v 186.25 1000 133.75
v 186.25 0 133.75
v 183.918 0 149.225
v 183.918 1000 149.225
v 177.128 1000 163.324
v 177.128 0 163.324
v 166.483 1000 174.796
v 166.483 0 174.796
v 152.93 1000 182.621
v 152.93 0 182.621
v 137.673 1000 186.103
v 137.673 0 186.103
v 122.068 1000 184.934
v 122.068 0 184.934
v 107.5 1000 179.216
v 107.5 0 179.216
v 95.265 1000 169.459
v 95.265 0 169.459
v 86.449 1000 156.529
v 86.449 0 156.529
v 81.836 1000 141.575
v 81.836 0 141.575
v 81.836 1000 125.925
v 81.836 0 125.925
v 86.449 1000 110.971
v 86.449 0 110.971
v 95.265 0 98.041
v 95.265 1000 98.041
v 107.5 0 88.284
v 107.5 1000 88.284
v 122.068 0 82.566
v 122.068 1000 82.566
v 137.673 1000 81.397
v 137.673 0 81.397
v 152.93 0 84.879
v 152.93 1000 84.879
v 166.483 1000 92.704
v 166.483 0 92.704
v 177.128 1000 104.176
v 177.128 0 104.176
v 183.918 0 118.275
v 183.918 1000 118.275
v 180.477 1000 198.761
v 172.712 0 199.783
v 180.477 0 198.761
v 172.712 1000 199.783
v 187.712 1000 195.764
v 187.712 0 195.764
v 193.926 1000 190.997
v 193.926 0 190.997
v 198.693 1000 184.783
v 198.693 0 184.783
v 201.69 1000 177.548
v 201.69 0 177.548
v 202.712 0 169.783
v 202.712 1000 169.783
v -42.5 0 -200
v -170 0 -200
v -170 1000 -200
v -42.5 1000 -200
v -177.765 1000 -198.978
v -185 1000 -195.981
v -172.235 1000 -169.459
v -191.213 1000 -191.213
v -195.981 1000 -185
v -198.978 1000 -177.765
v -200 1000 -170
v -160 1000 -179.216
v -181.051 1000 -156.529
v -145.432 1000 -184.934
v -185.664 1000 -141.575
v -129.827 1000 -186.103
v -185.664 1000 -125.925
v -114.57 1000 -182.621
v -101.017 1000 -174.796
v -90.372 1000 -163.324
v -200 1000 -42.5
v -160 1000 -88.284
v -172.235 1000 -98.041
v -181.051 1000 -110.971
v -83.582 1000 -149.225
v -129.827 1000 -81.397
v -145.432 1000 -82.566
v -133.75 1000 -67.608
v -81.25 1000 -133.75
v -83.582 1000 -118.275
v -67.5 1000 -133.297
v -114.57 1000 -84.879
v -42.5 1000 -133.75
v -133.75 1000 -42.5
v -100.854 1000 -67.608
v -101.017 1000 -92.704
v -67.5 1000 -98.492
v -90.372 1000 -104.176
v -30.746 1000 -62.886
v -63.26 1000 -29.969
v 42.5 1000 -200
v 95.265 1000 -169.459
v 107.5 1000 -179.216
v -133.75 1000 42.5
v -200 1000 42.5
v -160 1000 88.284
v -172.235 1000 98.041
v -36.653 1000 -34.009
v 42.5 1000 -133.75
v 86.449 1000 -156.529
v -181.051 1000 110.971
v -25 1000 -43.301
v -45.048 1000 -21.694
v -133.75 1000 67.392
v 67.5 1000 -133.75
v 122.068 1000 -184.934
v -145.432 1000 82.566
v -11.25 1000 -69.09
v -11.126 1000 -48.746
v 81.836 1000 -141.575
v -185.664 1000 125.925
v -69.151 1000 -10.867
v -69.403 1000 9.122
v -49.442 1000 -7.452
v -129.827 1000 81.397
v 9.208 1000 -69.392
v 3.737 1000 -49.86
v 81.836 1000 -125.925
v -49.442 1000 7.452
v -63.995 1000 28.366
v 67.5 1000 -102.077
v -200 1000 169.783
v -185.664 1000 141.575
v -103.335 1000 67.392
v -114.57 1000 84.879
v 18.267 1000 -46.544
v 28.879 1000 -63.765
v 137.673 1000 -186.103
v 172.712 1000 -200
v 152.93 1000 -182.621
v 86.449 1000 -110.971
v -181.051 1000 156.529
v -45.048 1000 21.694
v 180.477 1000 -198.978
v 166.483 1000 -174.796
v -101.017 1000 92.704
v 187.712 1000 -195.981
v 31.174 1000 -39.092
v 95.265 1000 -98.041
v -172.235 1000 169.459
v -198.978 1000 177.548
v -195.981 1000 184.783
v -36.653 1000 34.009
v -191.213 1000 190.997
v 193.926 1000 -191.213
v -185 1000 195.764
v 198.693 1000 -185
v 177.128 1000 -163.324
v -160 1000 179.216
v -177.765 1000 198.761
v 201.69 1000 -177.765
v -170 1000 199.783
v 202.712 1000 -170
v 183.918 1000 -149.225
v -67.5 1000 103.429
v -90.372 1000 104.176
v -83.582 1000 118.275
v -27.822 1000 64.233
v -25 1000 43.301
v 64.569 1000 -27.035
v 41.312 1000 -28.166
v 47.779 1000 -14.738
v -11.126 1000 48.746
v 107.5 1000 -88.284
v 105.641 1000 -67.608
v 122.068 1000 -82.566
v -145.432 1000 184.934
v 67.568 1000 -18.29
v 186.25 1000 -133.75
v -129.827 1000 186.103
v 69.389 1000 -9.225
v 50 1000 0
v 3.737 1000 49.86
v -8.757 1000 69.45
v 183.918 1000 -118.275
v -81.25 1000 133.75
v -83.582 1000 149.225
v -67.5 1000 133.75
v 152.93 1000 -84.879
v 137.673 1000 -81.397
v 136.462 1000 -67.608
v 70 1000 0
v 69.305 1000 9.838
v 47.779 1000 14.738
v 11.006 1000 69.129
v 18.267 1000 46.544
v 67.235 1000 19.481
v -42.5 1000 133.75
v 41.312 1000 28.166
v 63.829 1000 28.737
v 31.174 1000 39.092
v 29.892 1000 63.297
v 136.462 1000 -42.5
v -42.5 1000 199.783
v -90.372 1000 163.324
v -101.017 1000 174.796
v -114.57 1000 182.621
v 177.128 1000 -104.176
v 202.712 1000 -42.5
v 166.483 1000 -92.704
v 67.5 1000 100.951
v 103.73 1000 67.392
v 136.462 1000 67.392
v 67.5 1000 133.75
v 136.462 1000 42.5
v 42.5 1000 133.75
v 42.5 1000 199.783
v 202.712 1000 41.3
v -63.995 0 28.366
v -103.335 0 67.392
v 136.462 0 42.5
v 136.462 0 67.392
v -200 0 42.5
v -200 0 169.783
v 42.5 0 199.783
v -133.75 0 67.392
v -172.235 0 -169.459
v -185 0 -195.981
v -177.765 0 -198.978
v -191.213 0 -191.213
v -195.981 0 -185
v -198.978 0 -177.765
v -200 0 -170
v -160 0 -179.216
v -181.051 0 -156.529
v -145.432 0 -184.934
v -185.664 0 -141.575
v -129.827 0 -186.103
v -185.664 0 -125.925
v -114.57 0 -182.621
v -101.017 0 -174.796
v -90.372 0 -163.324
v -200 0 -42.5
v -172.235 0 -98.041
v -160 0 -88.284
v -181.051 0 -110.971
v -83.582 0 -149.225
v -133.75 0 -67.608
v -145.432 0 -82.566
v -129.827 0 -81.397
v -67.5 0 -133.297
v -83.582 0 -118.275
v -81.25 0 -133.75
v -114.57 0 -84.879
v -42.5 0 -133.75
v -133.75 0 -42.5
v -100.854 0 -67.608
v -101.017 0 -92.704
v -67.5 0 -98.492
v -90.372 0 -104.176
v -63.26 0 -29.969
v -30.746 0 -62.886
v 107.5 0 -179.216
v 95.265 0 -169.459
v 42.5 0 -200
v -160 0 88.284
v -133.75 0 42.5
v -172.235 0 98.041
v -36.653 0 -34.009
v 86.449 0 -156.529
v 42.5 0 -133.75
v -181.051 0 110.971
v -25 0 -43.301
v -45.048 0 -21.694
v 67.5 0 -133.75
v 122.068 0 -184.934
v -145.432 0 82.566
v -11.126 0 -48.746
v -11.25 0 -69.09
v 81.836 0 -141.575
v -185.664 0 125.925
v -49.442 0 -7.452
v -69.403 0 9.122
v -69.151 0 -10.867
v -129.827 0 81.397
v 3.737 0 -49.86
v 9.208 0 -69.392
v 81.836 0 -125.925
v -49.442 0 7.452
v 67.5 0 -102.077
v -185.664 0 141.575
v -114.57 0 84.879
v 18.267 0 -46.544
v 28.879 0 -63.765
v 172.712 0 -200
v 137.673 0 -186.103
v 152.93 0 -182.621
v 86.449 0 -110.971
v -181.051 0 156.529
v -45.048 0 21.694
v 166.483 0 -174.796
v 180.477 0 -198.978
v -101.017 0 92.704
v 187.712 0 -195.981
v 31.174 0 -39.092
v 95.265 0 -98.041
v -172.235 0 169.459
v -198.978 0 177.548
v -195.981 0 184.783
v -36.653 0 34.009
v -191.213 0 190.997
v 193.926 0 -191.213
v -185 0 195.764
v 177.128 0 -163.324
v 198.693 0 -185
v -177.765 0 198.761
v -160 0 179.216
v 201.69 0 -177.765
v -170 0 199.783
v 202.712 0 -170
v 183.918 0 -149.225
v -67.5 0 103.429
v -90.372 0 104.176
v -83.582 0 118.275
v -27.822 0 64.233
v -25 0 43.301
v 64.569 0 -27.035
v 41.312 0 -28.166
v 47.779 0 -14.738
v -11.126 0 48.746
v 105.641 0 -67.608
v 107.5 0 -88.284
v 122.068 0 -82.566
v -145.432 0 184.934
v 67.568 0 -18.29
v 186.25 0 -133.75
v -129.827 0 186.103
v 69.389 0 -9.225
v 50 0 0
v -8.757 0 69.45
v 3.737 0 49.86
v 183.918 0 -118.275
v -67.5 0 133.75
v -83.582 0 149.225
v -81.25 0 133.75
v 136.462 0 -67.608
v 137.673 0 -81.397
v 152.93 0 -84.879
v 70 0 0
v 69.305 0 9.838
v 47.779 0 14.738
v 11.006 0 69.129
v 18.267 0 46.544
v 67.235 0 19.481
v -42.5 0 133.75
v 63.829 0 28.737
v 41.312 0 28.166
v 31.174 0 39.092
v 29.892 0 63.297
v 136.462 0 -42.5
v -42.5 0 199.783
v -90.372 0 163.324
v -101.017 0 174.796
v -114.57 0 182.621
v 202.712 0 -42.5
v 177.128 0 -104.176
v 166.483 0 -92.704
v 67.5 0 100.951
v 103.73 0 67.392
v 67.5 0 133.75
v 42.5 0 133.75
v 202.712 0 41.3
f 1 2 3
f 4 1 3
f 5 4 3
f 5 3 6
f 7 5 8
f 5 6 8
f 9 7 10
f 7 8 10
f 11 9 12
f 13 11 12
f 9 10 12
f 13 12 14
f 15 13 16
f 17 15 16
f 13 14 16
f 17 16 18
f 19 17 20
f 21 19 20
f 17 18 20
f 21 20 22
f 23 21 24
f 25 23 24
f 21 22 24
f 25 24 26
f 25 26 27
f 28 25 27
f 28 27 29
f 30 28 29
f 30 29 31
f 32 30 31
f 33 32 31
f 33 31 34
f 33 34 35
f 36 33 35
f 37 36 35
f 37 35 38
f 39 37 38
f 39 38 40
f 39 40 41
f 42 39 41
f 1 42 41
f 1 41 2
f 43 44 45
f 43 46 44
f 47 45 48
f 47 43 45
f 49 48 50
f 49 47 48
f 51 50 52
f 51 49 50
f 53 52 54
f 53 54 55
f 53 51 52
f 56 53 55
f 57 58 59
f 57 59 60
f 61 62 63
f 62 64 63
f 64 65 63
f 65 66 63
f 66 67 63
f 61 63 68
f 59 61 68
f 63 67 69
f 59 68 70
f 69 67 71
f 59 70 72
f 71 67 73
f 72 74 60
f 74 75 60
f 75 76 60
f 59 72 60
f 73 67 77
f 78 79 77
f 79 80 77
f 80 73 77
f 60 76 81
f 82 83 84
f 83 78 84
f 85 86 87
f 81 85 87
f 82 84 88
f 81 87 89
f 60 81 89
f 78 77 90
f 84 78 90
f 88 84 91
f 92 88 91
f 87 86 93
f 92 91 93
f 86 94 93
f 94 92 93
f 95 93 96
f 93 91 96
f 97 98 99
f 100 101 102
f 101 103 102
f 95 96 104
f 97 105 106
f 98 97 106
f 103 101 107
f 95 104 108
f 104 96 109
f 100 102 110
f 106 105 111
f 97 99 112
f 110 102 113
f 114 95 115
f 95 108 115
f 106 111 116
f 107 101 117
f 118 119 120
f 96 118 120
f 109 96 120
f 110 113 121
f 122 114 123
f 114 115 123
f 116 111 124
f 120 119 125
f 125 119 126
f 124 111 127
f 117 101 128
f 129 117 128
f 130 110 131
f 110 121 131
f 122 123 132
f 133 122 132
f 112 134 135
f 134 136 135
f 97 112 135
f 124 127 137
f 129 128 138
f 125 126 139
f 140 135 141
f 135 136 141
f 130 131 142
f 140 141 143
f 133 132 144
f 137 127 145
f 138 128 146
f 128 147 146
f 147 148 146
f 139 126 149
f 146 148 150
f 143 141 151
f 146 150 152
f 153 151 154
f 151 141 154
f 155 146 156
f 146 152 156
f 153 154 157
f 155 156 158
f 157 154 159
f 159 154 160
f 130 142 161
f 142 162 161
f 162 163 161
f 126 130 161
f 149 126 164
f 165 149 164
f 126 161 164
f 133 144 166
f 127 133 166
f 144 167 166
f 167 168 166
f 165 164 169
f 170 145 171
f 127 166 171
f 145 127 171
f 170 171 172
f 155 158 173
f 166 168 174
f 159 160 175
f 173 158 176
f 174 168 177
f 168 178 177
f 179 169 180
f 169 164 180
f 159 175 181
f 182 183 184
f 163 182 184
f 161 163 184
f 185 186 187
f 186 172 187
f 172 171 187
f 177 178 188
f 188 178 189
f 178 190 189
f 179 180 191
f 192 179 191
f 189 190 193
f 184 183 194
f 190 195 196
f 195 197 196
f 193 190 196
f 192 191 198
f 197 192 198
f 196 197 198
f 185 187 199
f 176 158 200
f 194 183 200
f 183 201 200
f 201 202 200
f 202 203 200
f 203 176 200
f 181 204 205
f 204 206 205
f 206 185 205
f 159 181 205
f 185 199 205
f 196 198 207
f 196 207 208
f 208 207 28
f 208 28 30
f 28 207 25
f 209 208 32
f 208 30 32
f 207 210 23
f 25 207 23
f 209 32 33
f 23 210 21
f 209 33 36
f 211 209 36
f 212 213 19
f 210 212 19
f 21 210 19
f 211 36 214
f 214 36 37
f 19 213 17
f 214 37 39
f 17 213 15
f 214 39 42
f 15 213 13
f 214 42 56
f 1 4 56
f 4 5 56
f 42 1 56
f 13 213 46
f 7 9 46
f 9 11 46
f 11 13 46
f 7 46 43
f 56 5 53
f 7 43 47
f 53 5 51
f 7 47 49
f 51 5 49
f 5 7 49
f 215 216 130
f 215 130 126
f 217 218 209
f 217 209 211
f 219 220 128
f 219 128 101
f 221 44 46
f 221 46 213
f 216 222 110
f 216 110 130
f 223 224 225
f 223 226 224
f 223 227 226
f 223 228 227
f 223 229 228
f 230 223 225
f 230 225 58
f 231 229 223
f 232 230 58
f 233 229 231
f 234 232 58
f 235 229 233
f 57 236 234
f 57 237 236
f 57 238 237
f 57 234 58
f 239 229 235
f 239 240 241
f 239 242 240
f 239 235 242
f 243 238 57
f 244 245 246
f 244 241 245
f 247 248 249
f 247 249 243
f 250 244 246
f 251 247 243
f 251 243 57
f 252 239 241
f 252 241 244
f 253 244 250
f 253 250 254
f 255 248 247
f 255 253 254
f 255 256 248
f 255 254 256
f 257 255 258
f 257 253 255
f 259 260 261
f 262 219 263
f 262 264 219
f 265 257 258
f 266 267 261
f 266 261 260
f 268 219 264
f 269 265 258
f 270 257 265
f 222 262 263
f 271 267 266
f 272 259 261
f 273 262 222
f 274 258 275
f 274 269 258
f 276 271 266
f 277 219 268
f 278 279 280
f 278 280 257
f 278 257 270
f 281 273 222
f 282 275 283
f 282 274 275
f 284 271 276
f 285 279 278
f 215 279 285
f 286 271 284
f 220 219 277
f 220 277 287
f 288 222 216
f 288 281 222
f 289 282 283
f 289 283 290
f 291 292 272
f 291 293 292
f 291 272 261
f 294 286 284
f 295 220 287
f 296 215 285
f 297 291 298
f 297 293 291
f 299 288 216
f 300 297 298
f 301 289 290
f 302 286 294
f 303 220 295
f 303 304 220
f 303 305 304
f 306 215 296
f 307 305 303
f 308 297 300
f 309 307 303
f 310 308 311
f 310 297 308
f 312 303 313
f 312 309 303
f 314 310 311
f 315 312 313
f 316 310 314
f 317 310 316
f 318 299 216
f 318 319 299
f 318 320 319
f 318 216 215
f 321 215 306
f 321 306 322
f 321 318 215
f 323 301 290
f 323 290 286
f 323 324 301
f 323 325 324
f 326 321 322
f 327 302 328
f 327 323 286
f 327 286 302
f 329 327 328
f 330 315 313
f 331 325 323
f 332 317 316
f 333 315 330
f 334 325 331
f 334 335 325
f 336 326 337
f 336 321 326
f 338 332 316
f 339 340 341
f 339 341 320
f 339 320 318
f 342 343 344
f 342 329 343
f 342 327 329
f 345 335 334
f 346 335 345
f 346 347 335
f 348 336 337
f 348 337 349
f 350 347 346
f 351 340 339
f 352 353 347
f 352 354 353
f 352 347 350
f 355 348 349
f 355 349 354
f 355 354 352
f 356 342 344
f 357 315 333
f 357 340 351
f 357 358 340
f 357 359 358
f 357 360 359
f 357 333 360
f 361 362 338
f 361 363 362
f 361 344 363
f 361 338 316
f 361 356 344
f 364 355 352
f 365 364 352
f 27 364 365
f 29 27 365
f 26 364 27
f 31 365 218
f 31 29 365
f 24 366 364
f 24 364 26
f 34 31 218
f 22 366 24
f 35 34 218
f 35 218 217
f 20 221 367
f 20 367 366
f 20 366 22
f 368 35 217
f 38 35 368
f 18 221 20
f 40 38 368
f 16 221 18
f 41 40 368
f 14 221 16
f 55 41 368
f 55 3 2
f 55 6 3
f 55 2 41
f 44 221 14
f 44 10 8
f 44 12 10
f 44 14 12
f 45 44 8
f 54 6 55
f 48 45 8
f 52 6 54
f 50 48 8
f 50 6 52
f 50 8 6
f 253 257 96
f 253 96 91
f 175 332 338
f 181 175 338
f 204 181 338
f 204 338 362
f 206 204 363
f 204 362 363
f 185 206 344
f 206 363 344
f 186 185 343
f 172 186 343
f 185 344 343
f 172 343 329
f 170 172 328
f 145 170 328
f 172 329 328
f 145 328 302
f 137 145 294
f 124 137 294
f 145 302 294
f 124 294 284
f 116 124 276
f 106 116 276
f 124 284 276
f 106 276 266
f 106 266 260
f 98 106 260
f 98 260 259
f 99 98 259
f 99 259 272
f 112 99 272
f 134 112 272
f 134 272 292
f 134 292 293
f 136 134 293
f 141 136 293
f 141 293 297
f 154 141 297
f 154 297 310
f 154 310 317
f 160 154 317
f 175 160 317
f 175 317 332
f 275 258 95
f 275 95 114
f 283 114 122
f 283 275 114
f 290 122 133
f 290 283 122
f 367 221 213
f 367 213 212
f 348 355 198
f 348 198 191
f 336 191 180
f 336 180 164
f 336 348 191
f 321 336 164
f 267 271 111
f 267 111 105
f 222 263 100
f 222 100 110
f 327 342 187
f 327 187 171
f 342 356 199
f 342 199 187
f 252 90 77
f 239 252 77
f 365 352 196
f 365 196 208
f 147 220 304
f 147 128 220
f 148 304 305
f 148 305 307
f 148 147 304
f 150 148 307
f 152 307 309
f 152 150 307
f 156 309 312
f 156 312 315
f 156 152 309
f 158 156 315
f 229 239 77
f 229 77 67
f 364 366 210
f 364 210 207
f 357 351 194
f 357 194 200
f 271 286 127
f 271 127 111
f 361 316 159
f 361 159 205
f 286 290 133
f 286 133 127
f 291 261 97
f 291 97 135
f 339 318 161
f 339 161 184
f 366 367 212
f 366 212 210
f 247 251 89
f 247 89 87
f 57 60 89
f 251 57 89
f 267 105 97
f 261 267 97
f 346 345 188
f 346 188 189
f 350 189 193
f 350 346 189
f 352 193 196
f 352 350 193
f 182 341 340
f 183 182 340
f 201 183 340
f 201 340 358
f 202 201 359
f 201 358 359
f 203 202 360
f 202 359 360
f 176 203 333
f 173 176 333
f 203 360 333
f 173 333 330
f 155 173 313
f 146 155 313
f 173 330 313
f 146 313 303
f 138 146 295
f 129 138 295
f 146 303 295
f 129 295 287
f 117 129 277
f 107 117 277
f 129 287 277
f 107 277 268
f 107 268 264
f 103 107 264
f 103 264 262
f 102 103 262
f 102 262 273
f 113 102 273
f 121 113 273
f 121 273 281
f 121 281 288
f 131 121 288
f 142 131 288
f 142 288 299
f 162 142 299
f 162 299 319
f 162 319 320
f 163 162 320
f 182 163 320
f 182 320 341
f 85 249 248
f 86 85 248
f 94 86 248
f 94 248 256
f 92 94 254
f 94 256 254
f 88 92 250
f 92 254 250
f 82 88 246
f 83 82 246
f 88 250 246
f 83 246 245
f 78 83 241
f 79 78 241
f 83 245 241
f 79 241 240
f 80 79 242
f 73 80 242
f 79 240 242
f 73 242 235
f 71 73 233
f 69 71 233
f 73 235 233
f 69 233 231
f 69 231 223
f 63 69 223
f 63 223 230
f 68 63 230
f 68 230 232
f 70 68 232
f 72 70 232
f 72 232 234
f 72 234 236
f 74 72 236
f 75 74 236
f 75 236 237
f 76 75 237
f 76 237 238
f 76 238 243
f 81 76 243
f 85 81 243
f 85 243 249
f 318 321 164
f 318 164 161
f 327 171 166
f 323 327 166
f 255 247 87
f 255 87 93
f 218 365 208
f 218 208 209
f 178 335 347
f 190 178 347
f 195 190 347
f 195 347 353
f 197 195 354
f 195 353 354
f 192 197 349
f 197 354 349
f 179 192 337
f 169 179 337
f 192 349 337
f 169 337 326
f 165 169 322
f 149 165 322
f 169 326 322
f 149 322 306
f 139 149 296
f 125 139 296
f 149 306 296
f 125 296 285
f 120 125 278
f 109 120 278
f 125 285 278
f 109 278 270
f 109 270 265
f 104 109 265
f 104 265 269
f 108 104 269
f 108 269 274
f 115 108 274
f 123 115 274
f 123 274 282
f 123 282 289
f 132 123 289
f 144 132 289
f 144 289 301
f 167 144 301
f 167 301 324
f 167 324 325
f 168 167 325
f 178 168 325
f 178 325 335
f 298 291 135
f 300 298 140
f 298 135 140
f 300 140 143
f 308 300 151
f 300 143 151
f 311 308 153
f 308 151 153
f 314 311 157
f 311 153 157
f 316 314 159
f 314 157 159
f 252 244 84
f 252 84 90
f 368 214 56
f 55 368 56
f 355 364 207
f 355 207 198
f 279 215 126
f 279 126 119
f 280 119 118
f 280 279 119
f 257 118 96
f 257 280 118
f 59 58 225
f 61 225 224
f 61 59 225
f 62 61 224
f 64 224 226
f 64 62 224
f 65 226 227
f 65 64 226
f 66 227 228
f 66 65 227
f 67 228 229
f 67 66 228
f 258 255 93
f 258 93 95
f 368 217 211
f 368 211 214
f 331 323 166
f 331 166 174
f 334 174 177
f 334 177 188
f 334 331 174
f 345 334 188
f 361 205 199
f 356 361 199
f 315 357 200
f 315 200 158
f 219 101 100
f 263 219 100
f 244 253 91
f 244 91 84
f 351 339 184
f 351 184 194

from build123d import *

# Parameters (mm, degrees)
F1_DEPTH = 1000
F2_R     = 50
F2_R_2   = 52.5
F3_DEPTH = 2000
F4_R     = 30


with BuildPart() as f1:
    # F0 (on Front) → F1 (new body)
    with BuildSketch(Plane.XZ):
        with BuildLine():
            Line((-200, -133.75), (-200, -200))
            Line((-200, -200), (-42.5, -200))
            Line((-42.5, -200), (-42.5, -133.75))
            Line((-42.5, -133.75), (-67.5, -133.297282))
            Line((-67.5, -133.297282), (-67.5, -98.492385))
            Line((-67.5, -98.492385), (-30.746254, -62.88615))
            ThreePointArc((-30.746254, -62.88615), (-49.801599, -49.19147), (-63.260358, -29.96877))
            Line((-63.260358, -29.96877), (-100.854047, -67.608259))
            Line((-100.854047, -67.608259), (-133.75, -67.608259))
            Line((-133.75, -67.608259), (-133.75, -42.5))
            Line((-133.75, -42.5), (-200, -42.5))
            Line((-200, -42.5), (-200, -133.75))
        make_face()
        with BuildLine():
            ThreePointArc((-63.260358, -29.96877), (-49.801599, -49.19147), (-30.746254, -62.88615))
            ThreePointArc((-30.746254, -62.88615), (-1.031839, -69.992395), (28.879141, -63.765157))
            ThreePointArc((28.879141, -63.765157), (50.203622, -48.781106), (64.5687, -27.034847))
            ThreePointArc((64.5687, -27.034847), (68.628744, -13.787512), (70, 0))
            ThreePointArc((70, 0), (68.43998, 14.695888), (63.829453, 28.736751))
            ThreePointArc((63.829453, 28.736751), (49.94511, 49.045754), (29.891725, 63.296799))
            ThreePointArc((29.891725, 63.296799), (1.135837, 69.990784), (-27.822117, 64.233401))
            ThreePointArc((-27.822117, 64.233401), (-49.28701, 49.707048), (-63.994991, 28.366197))
            ThreePointArc((-63.994991, 28.366197), (-69.99445, -0.881465), (-63.260358, -29.96877))
        make_face()
        with BuildLine():
            ThreePointArc((64.5687, -27.034847), (50.203622, -48.781106), (28.879141, -63.765157))
            Line((28.879141, -63.765157), (67.5, -102.077139))
            Line((67.5, -102.077139), (67.5, -133.75))
            Line((67.5, -133.75), (42.5, -133.75))
            Line((42.5, -133.75), (42.5, -200))
            Line((42.5, -200), (202.712331, -200))
            Line((202.712331, -200), (202.712331, -42.5))
            Line((202.712331, -42.5), (136.462331, -42.5))
            Line((136.462331, -42.5), (136.462331, -67.608259))
            Line((136.462331, -67.608259), (105.641152, -67.608259))
            Line((105.641152, -67.608259), (64.5687, -27.034847))
        make_face()
        with BuildLine():
            Line((-103.335165, 67.391741), (-63.994991, 28.366197))
            ThreePointArc((-63.994991, 28.366197), (-49.28701, 49.707048), (-27.822117, 64.233401))
            Line((-27.822117, 64.233401), (-67.5, 103.429188))
            Line((-67.5, 103.429188), (-67.5, 133.75))
            Line((-67.5, 133.75), (-42.5, 133.75))
            Line((-42.5, 133.75), (-42.5, 199.783482))
            Line((-42.5, 199.783482), (-200, 199.783482))
            Line((-200, 199.783482), (-200, 42.5))
            Line((-200, 42.5), (-133.75, 42.5))
            Line((-133.75, 42.5), (-133.75, 67.391741))
            Line((-133.75, 67.391741), (-103.335165, 67.391741))
        make_face()
        with BuildLine():
            Line((67.5, 100.950892), (29.891725, 63.296799))
            ThreePointArc((29.891725, 63.296799), (49.94511, 49.045754), (63.829453, 28.736751))
            Line((63.829453, 28.736751), (103.730209, 67.391741))
            Line((103.730209, 67.391741), (136.462331, 67.391741))
            Line((136.462331, 67.391741), (136.462331, 42.5))
            Line((136.462331, 42.5), (202.712331, 41.300298))
            Line((202.712331, 41.300298), (202.712331, 199.783482))
            Line((202.712331, 199.783482), (42.5, 199.783482))
            Line((42.5, 199.783482), (42.5, 133.75))
            Line((42.5, 133.75), (67.5, 133.75))
            Line((67.5, 133.75), (67.5, 100.950892))
        make_face()
    extrude(amount=-F1_DEPTH)

    # F2 (on face) → F3 (cut)
    with BuildSketch(Plane.XZ):
        Circle(F2_R)
        with Locations((-133.75, 133.75)):
            Circle(F2_R_2)
        with Locations((133.75, 133.75)):
            Circle(F2_R_2)
        with Locations((133.75, -133.75)):
            Circle(F2_R_2)
        with Locations((-133.75, -133.75)):
            Circle(F2_R_2)
    extrude(amount=-F3_DEPTH, mode=Mode.SUBTRACT)

    # F4
    f4_edges = [f1.edges().sort_by_distance(p)[0] for p in [
        (202.712331, 500, 199.783482),
        (-200, 500, 199.783482),
        (202.712331, 500, -200),
        (-200, 500, -200),
    ]]
    fillet(f4_edges, radius=F4_R)


solid = f1.part
